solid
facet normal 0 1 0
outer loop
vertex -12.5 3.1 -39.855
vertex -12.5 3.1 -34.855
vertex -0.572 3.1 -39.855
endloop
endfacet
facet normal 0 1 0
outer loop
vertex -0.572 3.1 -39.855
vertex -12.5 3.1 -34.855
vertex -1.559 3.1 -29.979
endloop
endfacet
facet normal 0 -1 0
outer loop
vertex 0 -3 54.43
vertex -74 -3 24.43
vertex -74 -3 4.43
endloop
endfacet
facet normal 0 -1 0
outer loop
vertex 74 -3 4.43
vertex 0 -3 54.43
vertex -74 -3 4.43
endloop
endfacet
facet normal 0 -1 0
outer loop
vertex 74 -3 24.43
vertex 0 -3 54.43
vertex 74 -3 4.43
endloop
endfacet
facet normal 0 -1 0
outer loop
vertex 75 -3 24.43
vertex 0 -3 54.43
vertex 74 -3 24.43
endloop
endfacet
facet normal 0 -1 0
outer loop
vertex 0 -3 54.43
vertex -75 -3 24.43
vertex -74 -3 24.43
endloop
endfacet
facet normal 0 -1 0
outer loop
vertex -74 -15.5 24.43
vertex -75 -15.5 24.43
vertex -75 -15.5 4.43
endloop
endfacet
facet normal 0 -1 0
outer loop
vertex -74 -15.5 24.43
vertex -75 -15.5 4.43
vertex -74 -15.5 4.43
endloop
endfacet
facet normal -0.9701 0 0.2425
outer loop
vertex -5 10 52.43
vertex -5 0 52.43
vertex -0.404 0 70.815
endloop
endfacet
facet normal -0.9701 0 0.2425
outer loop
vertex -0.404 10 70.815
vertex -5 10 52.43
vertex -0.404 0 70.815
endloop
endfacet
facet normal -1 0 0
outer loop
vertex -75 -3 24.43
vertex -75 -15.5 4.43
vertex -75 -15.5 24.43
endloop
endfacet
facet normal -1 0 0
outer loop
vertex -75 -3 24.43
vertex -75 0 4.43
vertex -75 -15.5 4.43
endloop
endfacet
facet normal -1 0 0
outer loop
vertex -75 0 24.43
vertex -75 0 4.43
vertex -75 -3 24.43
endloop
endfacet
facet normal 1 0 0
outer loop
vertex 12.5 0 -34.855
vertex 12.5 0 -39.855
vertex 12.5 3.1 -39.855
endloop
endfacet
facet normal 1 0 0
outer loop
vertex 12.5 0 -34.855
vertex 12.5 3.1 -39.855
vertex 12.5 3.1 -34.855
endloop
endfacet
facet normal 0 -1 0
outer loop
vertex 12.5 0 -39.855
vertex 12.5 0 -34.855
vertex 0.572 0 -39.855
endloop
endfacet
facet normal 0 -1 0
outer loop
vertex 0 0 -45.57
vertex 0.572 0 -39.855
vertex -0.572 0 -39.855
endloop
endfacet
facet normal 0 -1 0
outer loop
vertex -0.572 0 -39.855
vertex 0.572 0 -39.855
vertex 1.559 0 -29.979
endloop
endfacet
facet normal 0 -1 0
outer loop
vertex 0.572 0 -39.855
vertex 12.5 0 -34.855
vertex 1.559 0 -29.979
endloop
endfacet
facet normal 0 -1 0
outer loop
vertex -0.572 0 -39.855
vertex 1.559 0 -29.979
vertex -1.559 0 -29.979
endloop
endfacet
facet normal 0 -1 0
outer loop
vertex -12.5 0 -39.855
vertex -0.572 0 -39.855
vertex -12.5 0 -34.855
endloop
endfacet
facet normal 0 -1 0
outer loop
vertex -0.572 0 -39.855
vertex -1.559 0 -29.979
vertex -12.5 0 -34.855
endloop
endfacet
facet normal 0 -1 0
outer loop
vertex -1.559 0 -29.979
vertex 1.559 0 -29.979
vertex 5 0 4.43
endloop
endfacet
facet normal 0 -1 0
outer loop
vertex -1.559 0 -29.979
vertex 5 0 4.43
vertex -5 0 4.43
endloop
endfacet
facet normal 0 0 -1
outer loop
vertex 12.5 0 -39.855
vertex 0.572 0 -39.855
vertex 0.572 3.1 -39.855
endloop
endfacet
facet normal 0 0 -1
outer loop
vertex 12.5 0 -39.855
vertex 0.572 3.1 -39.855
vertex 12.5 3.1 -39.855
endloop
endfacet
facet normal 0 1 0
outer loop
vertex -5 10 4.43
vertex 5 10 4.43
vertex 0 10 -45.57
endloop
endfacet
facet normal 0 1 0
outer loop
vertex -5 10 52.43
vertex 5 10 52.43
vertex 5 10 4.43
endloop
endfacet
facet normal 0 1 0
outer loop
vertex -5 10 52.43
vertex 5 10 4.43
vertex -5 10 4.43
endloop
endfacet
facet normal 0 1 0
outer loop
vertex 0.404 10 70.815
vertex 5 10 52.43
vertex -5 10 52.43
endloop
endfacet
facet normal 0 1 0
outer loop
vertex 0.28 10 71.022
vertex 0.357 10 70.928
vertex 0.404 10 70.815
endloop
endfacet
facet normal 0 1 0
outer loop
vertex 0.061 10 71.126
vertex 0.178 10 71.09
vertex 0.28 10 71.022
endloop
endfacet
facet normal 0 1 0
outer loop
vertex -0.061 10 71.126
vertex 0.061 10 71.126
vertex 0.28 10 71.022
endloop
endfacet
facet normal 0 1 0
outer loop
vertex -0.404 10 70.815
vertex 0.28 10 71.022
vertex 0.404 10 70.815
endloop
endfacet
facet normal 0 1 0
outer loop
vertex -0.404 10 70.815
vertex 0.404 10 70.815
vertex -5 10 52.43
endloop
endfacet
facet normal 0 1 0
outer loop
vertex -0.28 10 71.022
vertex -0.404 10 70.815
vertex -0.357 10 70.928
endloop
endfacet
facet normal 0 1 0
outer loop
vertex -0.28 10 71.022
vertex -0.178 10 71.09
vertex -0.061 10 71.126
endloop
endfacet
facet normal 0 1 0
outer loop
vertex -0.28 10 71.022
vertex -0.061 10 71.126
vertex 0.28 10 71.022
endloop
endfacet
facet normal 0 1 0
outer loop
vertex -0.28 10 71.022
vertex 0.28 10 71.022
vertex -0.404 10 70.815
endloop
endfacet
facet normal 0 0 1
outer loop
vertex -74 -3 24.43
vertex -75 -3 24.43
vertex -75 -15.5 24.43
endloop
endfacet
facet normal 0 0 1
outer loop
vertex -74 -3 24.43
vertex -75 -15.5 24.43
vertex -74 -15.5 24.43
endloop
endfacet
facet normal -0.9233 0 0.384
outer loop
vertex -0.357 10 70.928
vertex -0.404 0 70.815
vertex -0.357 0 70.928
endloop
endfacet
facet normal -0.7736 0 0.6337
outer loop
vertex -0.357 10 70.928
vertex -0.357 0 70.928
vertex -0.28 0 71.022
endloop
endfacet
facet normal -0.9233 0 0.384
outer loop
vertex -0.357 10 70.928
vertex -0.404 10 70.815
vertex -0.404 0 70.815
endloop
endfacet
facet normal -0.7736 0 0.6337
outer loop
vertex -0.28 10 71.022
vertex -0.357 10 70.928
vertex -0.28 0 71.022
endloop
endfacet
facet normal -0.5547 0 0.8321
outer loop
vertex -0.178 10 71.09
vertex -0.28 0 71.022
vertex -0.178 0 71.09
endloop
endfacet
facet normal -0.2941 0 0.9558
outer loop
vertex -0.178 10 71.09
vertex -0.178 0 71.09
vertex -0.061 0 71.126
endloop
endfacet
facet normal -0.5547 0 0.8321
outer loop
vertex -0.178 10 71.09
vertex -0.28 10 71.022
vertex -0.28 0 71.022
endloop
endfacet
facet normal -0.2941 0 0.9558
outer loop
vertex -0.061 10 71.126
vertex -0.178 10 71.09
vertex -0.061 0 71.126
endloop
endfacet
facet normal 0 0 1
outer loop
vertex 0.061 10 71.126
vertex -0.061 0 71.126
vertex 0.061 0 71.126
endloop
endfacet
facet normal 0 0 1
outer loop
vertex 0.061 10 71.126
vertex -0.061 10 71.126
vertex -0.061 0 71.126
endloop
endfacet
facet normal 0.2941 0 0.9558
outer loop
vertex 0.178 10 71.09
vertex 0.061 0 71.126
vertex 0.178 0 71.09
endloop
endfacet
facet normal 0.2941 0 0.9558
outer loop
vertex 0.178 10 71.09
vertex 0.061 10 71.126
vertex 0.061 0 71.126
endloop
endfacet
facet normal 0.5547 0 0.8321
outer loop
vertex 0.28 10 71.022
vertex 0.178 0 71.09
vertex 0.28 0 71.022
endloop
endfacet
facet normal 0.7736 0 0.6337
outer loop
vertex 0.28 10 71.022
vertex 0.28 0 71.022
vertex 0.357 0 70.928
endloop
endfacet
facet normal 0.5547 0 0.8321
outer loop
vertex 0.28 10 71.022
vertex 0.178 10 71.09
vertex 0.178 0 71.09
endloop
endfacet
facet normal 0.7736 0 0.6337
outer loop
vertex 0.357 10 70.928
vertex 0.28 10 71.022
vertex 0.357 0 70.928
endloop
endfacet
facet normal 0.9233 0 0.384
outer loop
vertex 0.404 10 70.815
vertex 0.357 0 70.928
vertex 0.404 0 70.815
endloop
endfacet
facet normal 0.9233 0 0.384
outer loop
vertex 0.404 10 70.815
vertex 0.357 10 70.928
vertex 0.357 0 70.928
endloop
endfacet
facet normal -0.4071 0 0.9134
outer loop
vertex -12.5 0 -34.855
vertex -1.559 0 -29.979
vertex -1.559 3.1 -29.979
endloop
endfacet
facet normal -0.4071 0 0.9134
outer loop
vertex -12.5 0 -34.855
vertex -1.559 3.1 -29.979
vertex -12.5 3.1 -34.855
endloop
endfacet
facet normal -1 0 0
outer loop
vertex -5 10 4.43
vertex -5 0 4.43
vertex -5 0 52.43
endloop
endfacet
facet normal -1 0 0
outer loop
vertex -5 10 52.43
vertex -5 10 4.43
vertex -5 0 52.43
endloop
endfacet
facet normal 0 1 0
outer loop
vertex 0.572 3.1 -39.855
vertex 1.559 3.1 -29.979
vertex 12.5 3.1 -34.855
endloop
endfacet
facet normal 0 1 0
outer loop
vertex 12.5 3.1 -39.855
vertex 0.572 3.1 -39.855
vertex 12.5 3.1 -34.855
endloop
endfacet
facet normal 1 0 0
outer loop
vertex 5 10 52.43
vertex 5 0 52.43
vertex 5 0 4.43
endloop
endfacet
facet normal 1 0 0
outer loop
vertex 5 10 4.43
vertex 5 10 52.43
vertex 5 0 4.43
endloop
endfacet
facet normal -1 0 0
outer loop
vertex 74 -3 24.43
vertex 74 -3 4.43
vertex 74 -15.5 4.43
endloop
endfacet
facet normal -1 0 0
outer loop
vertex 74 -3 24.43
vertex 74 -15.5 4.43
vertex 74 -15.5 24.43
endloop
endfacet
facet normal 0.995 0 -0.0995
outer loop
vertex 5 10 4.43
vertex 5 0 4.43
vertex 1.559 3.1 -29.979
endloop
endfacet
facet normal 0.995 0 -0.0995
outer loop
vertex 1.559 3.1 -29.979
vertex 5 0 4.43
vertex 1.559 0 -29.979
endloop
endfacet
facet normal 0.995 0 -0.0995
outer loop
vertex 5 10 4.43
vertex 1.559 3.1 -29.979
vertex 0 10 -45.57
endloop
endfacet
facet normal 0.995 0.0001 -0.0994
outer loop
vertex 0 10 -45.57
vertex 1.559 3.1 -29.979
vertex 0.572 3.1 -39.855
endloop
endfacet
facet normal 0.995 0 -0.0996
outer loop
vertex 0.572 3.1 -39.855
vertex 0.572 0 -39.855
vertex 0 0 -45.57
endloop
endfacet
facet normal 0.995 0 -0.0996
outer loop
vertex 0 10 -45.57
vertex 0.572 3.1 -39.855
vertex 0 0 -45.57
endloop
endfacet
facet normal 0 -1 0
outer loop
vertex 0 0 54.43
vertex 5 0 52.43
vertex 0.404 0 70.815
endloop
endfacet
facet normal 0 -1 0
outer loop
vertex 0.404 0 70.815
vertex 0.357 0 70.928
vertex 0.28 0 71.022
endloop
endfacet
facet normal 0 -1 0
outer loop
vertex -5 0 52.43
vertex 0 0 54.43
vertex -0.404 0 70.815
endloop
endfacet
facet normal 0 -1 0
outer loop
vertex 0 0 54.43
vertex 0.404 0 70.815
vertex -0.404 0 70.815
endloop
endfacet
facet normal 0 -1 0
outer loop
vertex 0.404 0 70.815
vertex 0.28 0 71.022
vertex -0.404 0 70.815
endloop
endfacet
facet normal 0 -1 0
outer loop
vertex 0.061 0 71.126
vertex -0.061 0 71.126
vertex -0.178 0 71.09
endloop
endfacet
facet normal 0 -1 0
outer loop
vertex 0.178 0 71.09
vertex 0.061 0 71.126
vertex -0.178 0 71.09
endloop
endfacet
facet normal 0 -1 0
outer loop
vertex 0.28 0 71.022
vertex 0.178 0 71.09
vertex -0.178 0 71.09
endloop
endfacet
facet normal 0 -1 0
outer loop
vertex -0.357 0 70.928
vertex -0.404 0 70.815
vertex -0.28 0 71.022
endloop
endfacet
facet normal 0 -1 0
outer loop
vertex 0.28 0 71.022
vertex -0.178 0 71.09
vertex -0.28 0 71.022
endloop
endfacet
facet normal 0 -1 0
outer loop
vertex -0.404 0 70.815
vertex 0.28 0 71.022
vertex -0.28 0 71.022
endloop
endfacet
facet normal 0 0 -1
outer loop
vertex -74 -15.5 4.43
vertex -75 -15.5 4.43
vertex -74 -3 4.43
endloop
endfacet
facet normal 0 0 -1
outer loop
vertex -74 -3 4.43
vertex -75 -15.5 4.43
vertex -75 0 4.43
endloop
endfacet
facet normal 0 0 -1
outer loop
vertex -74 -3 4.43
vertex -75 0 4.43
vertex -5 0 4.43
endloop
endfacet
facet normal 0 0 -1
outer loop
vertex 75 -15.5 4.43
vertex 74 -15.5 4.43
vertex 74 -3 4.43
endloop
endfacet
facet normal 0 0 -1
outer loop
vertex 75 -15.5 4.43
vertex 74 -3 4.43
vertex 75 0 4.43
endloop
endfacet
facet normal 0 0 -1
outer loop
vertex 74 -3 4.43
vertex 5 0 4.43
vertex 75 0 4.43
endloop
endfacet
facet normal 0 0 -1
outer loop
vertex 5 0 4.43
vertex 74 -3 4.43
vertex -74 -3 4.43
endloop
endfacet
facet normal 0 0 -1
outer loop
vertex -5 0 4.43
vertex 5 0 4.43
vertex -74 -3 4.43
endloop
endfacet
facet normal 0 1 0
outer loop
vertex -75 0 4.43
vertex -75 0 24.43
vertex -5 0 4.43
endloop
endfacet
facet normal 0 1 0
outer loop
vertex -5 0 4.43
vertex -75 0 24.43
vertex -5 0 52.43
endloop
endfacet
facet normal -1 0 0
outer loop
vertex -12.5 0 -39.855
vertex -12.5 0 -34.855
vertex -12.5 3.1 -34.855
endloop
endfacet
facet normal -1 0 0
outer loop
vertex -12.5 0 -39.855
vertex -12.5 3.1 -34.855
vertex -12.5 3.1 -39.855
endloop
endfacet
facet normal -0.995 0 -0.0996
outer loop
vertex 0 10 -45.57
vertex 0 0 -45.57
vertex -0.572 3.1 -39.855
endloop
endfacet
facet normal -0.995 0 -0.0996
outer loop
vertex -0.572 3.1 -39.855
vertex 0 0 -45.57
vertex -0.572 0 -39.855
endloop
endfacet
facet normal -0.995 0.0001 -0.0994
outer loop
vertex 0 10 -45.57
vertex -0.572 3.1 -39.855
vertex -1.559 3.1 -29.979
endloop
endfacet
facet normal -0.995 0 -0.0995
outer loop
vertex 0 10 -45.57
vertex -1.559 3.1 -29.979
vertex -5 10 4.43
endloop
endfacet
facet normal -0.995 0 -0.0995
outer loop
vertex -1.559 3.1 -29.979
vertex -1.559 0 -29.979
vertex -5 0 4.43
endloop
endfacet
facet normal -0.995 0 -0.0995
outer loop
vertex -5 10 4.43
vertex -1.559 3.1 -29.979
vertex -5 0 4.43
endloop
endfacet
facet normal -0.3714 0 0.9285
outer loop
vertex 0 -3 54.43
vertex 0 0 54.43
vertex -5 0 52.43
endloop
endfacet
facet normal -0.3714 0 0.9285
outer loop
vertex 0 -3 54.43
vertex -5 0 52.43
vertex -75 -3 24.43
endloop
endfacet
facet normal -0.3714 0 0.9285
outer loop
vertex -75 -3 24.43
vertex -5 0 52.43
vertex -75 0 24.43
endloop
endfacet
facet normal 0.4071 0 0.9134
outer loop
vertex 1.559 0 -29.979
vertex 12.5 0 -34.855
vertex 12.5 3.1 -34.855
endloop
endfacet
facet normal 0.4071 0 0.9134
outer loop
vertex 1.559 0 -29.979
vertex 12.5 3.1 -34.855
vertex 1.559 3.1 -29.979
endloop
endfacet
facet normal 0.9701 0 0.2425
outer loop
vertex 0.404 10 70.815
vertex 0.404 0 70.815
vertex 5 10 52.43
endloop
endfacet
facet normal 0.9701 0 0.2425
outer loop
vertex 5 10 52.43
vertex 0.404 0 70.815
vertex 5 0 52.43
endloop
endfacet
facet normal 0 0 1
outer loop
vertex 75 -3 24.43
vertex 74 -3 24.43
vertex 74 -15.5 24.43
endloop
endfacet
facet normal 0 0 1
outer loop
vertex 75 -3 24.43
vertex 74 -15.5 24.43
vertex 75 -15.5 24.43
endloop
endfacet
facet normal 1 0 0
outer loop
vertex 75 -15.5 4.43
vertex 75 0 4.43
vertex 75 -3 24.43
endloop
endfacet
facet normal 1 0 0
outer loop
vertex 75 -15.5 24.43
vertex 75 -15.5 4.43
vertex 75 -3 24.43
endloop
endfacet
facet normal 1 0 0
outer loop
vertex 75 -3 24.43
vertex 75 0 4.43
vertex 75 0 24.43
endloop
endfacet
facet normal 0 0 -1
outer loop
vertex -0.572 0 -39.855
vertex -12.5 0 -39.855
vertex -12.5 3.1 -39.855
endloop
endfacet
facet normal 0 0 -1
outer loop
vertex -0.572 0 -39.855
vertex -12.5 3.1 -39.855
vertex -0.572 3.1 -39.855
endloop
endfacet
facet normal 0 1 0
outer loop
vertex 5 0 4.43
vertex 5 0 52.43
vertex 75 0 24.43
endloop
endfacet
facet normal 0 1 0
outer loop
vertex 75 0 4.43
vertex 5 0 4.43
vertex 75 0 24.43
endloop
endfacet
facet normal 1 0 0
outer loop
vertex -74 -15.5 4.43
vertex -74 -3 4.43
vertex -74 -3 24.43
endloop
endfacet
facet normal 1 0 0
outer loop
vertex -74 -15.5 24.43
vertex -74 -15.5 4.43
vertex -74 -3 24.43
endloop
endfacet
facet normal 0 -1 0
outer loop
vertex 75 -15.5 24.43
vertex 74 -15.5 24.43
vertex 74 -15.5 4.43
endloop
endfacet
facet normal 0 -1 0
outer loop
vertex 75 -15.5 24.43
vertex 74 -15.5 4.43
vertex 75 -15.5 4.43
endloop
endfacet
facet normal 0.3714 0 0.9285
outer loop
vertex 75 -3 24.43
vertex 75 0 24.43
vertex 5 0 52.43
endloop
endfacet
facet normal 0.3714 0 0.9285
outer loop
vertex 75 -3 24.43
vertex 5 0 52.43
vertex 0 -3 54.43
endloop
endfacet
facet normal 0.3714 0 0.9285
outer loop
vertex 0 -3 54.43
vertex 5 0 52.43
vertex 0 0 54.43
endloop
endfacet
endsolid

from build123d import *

# Parameters (mm, degrees)
F1_DEPTH = 3
F2_W     = 1
F2_H     = 20
F3_DEPTH = 12.5
F5_DEPTH = 10
F6_DEPTH = 10
F8_DEPTH = 3.1
F9_R     = 0.4162523321


with BuildPart() as f1:
    # F0 (on Front) → F1 (new body)
    with BuildSketch(Plane.XZ):
        Polygon((0, 54.4300840236), (-75, 24.4300840236), (-75, 4.4300840236), (0, 4.4300840236), align=None)
        Polygon((75, 24.4300840236), (0, 54.4300840236), (0, 4.4300840236), (75, 4.4300840236), align=None)
    extrude(amount=F1_DEPTH)

    # F2 (on face) → F3 (join)
    with BuildSketch(Plane.XZ.offset(3)):
        with Locations((-74.5, 14.4300840236)):
            Rectangle(F2_W, F2_H)
        with Locations((74.5, 14.4300840236)):
            Rectangle(F2_W, F2_H)
    extrude(amount=F3_DEPTH)

    # F4 (on face) → F5 (join)
    with BuildSketch(Plane(origin=(0, 0, 0), x_dir=(-1, 0, 0), z_dir=(0, 1, 0))):
        Polygon((-5, 4.4300840236), (0, 4.4300840236), (5, 4.4300840236), (5, 52.4300840236), (0, 52.4300840236), (-5, 52.4300840236), align=None)
    extrude(amount=F5_DEPTH)

    # F4 (on face) → F6 (join)
    with BuildSketch(Plane(origin=(0, 0, 0), x_dir=(-1, 0, 0), z_dir=(0, 1, 0))):
        Polygon((-5, 4.4300840236), (0, 4.4300840236), (5, 4.4300840236), (5, 52.4300840236), (0, 52.4300840236), (-5, 52.4300840236), align=None)
        Polygon((0, -45.5699159764), (0, 4.4300840236), (-5, 4.4300840236), align=None)
        Polygon((5, 4.4300840236), (0, 4.4300840236), (0, -45.5699159764), align=None)
        Polygon((0, 52.4300840236), (5, 52.4300840236), (0, 72.4300840236), align=None)
        Polygon((0, 72.4300840236), (-5, 52.4300840236), (0, 52.4300840236), align=None)
    extrude(amount=F6_DEPTH)

    # F7 (on face) → F8 (join)
    with BuildSketch(Plane.XZ):
        Polygon((-12.5, -39.854593575), (-0.5715322401, -39.854593575), (-1.5591000635, -29.9789153418), (-12.5, -34.854593575), align=None)
        Polygon((1.5591000635, -29.9789153418), (0.5715322401, -39.854593575), (12.5, -39.854593575), (12.5, -34.854593575), align=None)
    extrude(amount=-F8_DEPTH)

    # F9
    f9_edges = [f1.edges().sort_by_distance(p)[0] for p in [
        (0, 5, 72.430084),
    ]]
    fillet(f9_edges, radius=F9_R)


solid = f1.part
